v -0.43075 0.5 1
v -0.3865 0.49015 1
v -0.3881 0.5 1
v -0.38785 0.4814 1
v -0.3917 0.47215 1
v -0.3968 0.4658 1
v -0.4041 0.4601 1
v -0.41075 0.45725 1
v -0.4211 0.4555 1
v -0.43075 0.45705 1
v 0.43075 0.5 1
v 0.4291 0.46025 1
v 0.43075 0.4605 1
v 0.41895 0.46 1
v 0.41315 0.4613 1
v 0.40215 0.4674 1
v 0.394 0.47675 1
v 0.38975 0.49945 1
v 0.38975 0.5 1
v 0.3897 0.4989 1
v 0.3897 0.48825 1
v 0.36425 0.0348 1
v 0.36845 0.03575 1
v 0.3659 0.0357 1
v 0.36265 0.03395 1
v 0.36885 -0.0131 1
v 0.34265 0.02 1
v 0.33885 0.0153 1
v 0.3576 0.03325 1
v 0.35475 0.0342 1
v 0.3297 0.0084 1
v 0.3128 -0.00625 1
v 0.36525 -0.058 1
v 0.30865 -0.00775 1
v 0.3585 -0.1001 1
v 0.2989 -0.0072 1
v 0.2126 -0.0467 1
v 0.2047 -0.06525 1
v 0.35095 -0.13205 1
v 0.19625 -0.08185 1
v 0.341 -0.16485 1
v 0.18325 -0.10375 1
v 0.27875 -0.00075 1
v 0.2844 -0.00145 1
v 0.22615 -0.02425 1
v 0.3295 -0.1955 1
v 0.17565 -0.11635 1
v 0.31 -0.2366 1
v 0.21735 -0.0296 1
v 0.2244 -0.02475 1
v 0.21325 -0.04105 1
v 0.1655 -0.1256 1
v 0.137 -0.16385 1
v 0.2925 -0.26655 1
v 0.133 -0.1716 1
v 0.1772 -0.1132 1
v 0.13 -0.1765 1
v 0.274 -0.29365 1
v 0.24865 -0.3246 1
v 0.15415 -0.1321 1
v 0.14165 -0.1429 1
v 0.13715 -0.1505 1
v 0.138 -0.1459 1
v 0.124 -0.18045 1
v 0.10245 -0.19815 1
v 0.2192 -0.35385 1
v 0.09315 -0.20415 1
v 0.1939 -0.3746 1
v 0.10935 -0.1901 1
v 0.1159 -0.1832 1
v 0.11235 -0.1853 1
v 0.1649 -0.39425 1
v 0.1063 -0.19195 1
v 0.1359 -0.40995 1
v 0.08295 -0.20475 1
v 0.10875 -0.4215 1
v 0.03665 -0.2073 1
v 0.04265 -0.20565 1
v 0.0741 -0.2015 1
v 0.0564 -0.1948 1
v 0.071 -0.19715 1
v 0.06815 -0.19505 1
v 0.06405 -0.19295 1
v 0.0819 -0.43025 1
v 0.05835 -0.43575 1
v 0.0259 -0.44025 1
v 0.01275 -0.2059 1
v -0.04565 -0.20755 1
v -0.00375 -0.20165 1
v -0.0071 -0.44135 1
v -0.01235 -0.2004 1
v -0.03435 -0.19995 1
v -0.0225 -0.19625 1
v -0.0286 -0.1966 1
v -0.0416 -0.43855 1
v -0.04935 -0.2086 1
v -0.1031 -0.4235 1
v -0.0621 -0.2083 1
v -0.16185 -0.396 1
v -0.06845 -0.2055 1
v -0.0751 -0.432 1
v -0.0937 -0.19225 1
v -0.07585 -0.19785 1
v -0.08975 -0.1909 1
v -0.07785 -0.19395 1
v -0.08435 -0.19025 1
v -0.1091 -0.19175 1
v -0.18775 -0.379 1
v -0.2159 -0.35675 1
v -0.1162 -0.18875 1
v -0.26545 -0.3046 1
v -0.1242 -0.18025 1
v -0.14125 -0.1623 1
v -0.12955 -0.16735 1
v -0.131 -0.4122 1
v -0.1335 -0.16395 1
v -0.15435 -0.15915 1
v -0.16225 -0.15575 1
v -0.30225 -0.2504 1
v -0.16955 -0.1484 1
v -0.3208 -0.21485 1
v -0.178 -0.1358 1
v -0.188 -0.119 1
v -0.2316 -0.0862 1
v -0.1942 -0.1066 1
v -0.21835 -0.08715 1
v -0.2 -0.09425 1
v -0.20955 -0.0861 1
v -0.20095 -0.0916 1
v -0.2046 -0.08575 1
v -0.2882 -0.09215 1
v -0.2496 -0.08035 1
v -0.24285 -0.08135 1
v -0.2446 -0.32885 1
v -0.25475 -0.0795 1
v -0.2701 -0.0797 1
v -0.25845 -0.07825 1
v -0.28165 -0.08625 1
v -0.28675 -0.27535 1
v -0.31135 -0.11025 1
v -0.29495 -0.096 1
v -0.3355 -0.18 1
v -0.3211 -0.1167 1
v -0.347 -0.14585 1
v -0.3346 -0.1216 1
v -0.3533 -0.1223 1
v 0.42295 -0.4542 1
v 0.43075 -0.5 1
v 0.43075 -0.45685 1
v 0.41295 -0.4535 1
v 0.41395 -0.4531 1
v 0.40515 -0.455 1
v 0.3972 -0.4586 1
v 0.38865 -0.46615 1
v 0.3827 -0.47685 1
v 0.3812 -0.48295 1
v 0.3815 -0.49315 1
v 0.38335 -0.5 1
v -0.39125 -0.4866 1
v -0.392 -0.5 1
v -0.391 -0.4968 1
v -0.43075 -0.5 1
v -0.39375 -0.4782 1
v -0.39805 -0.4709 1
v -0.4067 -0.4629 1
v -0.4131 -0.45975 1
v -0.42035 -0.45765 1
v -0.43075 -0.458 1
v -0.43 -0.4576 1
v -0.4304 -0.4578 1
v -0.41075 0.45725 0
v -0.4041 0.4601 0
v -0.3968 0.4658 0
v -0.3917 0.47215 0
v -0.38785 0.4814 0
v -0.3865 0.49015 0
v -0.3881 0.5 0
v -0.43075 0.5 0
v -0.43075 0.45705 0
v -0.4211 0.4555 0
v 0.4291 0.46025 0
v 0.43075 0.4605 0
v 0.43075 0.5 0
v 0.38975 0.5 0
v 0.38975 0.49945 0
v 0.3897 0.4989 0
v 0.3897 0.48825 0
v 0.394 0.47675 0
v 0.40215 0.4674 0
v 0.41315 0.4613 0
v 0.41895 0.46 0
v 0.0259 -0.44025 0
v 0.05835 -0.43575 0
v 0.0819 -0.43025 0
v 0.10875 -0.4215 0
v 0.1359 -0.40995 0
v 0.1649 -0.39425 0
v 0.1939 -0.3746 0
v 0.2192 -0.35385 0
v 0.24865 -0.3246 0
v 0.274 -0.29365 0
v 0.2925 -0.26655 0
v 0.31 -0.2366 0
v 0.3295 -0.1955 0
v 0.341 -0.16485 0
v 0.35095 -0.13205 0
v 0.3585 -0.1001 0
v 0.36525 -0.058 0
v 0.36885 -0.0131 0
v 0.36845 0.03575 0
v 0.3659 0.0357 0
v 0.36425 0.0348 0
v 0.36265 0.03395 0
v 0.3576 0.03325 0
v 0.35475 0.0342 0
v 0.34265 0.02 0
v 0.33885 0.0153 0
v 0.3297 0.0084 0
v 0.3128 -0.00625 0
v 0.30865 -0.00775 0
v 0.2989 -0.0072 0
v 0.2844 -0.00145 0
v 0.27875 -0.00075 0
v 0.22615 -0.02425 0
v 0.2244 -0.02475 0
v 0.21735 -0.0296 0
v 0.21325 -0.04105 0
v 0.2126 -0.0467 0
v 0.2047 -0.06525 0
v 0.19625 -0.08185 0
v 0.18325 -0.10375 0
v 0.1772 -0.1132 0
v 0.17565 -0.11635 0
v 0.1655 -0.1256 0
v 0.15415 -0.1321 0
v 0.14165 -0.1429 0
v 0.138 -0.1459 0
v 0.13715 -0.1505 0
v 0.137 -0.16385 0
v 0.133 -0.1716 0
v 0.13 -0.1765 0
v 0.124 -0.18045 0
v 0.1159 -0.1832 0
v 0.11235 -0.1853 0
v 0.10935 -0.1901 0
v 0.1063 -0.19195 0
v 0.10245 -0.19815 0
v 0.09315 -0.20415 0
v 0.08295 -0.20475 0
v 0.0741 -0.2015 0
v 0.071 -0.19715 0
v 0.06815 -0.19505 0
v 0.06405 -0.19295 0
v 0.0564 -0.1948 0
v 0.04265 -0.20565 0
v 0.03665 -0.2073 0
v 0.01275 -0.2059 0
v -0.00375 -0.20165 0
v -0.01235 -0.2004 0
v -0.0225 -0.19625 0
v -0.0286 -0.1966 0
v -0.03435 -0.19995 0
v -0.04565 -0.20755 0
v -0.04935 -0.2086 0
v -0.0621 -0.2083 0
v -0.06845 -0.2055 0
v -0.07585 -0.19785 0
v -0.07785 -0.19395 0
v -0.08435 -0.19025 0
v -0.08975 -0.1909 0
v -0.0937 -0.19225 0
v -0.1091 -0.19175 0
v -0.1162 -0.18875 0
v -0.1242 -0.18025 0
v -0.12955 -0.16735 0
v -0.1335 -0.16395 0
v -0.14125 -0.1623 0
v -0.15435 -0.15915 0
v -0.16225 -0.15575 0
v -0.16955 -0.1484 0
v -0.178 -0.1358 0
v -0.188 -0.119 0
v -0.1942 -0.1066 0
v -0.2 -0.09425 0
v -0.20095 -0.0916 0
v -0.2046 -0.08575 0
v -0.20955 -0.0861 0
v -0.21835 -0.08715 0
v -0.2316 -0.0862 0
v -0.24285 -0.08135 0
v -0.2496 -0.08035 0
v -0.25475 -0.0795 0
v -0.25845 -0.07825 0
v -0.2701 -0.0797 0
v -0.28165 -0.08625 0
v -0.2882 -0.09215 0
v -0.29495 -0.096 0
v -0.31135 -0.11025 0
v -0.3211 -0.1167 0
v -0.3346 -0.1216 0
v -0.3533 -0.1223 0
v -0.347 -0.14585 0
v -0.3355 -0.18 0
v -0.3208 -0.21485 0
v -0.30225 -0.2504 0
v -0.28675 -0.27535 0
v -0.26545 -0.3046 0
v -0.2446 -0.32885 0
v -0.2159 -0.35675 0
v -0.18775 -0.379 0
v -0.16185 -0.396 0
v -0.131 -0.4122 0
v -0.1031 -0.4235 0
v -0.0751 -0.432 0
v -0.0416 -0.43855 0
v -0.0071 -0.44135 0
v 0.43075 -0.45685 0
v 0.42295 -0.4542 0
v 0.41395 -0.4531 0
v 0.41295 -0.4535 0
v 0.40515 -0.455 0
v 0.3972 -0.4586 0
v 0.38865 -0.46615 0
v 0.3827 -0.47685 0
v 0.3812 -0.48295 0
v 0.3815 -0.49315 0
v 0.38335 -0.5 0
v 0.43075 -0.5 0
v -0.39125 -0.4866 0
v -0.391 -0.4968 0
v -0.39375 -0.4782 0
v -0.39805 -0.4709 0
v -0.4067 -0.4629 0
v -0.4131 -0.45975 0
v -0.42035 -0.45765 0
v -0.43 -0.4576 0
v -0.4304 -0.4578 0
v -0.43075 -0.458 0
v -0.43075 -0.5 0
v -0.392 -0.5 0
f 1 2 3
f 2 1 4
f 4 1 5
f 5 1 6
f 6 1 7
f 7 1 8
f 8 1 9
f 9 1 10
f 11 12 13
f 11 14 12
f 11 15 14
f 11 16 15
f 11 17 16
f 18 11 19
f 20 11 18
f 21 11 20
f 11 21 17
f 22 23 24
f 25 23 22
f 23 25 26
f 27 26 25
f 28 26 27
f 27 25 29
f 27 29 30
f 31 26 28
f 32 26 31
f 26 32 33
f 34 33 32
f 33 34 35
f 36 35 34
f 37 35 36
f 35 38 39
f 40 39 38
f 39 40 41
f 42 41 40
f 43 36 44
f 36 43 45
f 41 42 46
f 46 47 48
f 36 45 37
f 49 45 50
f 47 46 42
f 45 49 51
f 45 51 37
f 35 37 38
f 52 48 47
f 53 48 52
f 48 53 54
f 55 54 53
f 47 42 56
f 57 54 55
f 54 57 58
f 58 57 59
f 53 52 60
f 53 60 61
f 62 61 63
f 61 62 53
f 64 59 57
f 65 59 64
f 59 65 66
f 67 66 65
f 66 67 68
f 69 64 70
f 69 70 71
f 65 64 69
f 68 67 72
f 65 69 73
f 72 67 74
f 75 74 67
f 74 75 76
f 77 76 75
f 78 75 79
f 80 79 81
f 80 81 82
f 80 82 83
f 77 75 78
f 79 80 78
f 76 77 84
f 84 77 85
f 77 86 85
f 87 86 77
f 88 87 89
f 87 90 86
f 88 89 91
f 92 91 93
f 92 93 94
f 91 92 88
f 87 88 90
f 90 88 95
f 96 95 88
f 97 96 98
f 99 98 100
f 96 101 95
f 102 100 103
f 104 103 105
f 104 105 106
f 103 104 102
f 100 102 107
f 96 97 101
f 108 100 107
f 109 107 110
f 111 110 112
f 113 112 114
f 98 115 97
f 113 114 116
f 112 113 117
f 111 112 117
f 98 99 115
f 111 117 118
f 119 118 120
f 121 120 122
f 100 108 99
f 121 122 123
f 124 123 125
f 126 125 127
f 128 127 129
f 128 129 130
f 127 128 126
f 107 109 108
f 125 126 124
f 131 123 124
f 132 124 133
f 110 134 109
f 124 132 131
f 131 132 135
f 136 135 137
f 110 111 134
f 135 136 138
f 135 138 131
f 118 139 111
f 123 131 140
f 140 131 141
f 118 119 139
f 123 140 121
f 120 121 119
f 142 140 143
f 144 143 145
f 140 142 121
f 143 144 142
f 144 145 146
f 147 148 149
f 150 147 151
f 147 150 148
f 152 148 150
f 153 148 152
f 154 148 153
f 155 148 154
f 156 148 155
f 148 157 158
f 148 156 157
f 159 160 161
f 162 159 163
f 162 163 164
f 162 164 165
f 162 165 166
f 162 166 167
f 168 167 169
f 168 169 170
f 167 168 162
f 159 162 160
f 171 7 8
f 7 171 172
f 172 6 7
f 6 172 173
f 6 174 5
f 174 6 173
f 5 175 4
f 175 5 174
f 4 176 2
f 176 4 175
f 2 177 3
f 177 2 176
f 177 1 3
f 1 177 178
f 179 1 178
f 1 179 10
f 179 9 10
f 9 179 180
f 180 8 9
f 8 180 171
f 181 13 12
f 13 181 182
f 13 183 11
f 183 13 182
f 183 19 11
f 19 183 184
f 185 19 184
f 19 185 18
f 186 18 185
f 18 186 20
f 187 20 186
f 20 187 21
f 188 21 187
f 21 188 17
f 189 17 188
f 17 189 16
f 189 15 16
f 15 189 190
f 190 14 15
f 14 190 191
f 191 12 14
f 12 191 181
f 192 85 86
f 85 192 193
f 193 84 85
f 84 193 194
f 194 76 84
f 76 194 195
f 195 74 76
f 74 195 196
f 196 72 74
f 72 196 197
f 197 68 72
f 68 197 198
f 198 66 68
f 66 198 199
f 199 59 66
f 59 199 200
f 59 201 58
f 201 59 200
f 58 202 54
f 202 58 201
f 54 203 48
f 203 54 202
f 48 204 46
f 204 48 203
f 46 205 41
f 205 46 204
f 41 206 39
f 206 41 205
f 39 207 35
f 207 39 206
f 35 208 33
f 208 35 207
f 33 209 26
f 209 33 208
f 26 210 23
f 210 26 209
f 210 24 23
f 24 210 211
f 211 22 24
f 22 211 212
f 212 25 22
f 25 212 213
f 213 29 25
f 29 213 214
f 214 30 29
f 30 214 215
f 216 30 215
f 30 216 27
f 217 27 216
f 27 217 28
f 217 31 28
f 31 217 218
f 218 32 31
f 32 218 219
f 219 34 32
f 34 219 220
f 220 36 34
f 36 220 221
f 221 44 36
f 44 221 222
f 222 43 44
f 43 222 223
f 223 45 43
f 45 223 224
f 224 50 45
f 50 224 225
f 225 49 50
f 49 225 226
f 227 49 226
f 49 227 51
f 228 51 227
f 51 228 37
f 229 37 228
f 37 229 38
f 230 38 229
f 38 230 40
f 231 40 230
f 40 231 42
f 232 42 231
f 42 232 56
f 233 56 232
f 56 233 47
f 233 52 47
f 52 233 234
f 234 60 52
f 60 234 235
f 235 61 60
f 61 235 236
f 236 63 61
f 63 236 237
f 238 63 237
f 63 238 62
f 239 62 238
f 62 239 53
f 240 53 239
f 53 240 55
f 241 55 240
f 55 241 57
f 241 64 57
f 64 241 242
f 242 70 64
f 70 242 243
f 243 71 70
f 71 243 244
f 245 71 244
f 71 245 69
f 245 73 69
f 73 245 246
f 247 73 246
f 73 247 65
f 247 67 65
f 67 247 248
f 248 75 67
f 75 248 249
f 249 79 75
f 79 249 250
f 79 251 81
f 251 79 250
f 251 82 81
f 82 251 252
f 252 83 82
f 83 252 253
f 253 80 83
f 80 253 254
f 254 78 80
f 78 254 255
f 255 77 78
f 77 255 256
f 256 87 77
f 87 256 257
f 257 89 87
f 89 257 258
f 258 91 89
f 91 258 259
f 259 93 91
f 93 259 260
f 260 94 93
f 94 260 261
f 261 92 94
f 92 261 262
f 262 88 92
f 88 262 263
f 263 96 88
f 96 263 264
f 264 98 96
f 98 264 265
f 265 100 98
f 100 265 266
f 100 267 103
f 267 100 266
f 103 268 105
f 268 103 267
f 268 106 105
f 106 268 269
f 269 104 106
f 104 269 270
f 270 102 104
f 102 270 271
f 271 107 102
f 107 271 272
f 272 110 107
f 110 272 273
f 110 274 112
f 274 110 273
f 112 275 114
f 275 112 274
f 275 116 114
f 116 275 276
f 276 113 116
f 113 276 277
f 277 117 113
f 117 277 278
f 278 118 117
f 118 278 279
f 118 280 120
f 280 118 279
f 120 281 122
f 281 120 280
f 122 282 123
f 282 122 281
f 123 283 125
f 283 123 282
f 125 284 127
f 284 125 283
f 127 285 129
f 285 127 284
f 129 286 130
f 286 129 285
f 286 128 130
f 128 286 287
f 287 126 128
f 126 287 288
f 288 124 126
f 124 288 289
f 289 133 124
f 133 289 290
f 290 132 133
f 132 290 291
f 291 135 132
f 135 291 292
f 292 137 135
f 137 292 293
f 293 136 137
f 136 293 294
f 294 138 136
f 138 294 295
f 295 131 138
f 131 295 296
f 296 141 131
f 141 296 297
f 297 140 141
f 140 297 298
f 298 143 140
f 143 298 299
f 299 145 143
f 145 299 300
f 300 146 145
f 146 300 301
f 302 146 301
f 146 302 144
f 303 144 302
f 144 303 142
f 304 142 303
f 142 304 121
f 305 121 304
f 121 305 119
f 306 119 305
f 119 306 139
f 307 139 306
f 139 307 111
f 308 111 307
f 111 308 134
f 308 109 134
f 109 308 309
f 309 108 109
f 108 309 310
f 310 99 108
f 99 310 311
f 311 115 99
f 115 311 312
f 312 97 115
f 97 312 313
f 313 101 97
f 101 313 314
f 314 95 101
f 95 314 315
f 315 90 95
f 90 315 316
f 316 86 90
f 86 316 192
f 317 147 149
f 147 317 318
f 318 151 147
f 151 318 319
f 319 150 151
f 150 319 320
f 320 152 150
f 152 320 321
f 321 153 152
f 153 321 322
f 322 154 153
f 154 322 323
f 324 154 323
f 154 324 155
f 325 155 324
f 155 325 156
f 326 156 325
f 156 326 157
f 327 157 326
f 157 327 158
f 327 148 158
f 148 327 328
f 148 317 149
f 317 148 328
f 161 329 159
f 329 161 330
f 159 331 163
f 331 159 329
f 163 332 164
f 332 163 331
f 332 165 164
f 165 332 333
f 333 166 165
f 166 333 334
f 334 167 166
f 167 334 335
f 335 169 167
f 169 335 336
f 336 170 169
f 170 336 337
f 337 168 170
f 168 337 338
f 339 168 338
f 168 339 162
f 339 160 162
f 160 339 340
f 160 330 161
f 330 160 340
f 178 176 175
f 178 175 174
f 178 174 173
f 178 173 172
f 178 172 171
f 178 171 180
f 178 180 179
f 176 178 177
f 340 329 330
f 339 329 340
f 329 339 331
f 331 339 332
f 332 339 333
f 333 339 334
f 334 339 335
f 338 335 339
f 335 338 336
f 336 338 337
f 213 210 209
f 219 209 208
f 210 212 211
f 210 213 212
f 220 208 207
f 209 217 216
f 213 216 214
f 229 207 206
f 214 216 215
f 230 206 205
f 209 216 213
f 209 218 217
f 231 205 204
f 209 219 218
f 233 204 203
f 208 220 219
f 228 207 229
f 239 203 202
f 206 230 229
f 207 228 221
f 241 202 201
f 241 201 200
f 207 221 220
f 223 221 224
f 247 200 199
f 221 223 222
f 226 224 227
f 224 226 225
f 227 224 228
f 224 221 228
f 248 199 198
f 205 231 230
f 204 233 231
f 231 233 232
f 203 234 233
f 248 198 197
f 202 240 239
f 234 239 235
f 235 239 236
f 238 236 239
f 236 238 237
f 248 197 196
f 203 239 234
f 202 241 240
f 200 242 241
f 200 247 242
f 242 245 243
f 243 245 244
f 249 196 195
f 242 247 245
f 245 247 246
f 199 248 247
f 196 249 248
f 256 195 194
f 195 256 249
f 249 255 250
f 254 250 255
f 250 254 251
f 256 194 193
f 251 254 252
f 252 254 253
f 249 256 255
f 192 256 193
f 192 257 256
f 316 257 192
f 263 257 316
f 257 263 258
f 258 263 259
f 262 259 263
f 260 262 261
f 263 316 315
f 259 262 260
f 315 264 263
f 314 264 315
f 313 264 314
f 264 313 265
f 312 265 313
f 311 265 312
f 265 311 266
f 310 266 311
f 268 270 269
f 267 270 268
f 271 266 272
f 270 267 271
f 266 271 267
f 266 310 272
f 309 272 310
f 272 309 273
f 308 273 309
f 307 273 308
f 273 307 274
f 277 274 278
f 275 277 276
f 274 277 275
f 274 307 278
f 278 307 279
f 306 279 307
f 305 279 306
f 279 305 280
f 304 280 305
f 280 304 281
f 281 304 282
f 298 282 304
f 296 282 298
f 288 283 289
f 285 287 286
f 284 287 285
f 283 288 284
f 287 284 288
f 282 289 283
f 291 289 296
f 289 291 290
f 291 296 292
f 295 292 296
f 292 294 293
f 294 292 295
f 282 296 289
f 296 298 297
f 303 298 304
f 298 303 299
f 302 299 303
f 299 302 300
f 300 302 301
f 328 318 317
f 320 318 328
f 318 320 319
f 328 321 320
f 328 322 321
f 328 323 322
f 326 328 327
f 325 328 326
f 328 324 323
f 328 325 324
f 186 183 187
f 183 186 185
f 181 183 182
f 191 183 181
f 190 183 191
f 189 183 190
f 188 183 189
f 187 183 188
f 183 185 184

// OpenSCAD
module Hedwig2green2_1()
{
 /* Generated by trace2scad version 20150415
    http://aggregate.org/MAKE/TRACE2SCAD/
    Optimized model has 172/2033 original points
 */
 color([0.5, 0.5, 0.5])
 assign(minx=0) /* polygon minx=0 */
 assign(miny=0) /* polygon miny=0 */
 assign(maxx=17230) /* polygon maxx=17230 */
 assign(maxy=20000) /* polygon maxy=20000 */
 assign(dx=maxx-minx)
 assign(dy=maxy-miny)
 assign(maxd=((dx>dy)?dx:dy))
 scale([1/maxd, 1/maxd, 1])
 translate([-minx-dx/2, -miny-dy/2, 0])
 linear_extrude(height=1, convexity=172)
 union() {
  union() {
   polygon([[0,19571],[0,19141],[193,19110],[400,19145],[533,19202],[679,19316],[781,19443],[858,19628],[885,19803],[853,20000],[0,20000]], convexity=5);
   polygon([[16410,19989],[16409,19978],[16409,19765],[16495,19535],[16658,19348],[16878,19226],[16994,19200],[17197,19205],[17230,19210],[17230,20000],[16410,20000]], convexity=6);
   polygon([[15900,10696],[15868,10679],[15767,10665],[15710,10684],[15468,10400],[15392,10306],[15209,10168],[14871,9875],[14788,9845],[14593,9856],[14303,9971],[14190,9985],[13138,9515],[13103,9505],[12962,9408],[12880,9179],[12867,9066],[12709,8695],[12540,8363],[12280,7925],[12159,7736],[12128,7673],[11925,7488],[11698,7358],[11448,7142],[11375,7082],[11358,6990],[11355,6723],[11275,6568],[11215,6470],[11095,6391],[10933,6336],[10862,6294],[10802,6198],[10741,6161],[10664,6037],[10478,5917],[10274,5905],[10097,5970],[10035,6057],[9978,6099],[9896,6141],[9743,6104],[9468,5887],[9348,5854],[8870,5882],[8540,5967],[8368,5992],[8165,6075],[8043,6068],[7928,6001],[7702,5849],[7628,5828],[7373,5834],[7246,5890],[7098,6043],[7058,6121],[6928,6195],[6820,6182],[6741,6155],[6433,6165],[6291,6225],[6131,6395],[6024,6653],[5945,6721],[5790,6754],[5528,6817],[5370,6885],[5224,7032],[5055,7284],[4855,7620],[4731,7868],[4615,8115],[4596,8168],[4523,8285],[4424,8278],[4248,8257],[3983,8276],[3758,8373],[3623,8393],[3520,8410],[3446,8435],[3213,8406],[2982,8275],[2851,8157],[2716,8080],[2388,7795],[2193,7666],[1923,7568],[1549,7554],[1675,7083],[1905,6400],[2199,5703],[2570,4992],[2880,4493],[3306,3908],[3723,3423],[4297,2865],[4860,2420],[5378,2080],[5995,1756],[6553,1530],[7113,1360],[7783,1229],[8473,1173],[9133,1195],[9782,1285],[10253,1395],[10790,1570],[11333,1801],[11913,2115],[12493,2508],[12999,2923],[13588,3508],[14095,4127],[14465,4669],[14815,5268],[15205,6090],[15435,6703],[15634,7359],[15785,7998],[15920,8840],[15992,9738],[15984,10715],[15933,10714]], convexity=21);
   polygon([[16884,934],[16874,930],[16718,900],[16559,828],[16388,677],[16269,463],[16239,341],[16245,137],[16282,0],[17230,0],[17230,863],[17074,916],[16894,938]], convexity=6);
   polygon([[7,844],[0,840],[0,0],[775,0],[795,64],[790,268],[740,436],[654,582],[481,742],[353,805],[208,847],[15,848]], convexity=6);
  }
 }
}

module Hedwig2green2()
{
 /* all layers combined, scaled to within a 1mm cube */
 scale([1, 1, 1/1])
 difference() {
  union() {
   scale([1,1,2]) translate([0,0,-0.5]) Hedwig2green2_1();
  }
  translate([0,0,-2]) cube([2,2,4],center=true);
 }
}
Hedwig2green2();
